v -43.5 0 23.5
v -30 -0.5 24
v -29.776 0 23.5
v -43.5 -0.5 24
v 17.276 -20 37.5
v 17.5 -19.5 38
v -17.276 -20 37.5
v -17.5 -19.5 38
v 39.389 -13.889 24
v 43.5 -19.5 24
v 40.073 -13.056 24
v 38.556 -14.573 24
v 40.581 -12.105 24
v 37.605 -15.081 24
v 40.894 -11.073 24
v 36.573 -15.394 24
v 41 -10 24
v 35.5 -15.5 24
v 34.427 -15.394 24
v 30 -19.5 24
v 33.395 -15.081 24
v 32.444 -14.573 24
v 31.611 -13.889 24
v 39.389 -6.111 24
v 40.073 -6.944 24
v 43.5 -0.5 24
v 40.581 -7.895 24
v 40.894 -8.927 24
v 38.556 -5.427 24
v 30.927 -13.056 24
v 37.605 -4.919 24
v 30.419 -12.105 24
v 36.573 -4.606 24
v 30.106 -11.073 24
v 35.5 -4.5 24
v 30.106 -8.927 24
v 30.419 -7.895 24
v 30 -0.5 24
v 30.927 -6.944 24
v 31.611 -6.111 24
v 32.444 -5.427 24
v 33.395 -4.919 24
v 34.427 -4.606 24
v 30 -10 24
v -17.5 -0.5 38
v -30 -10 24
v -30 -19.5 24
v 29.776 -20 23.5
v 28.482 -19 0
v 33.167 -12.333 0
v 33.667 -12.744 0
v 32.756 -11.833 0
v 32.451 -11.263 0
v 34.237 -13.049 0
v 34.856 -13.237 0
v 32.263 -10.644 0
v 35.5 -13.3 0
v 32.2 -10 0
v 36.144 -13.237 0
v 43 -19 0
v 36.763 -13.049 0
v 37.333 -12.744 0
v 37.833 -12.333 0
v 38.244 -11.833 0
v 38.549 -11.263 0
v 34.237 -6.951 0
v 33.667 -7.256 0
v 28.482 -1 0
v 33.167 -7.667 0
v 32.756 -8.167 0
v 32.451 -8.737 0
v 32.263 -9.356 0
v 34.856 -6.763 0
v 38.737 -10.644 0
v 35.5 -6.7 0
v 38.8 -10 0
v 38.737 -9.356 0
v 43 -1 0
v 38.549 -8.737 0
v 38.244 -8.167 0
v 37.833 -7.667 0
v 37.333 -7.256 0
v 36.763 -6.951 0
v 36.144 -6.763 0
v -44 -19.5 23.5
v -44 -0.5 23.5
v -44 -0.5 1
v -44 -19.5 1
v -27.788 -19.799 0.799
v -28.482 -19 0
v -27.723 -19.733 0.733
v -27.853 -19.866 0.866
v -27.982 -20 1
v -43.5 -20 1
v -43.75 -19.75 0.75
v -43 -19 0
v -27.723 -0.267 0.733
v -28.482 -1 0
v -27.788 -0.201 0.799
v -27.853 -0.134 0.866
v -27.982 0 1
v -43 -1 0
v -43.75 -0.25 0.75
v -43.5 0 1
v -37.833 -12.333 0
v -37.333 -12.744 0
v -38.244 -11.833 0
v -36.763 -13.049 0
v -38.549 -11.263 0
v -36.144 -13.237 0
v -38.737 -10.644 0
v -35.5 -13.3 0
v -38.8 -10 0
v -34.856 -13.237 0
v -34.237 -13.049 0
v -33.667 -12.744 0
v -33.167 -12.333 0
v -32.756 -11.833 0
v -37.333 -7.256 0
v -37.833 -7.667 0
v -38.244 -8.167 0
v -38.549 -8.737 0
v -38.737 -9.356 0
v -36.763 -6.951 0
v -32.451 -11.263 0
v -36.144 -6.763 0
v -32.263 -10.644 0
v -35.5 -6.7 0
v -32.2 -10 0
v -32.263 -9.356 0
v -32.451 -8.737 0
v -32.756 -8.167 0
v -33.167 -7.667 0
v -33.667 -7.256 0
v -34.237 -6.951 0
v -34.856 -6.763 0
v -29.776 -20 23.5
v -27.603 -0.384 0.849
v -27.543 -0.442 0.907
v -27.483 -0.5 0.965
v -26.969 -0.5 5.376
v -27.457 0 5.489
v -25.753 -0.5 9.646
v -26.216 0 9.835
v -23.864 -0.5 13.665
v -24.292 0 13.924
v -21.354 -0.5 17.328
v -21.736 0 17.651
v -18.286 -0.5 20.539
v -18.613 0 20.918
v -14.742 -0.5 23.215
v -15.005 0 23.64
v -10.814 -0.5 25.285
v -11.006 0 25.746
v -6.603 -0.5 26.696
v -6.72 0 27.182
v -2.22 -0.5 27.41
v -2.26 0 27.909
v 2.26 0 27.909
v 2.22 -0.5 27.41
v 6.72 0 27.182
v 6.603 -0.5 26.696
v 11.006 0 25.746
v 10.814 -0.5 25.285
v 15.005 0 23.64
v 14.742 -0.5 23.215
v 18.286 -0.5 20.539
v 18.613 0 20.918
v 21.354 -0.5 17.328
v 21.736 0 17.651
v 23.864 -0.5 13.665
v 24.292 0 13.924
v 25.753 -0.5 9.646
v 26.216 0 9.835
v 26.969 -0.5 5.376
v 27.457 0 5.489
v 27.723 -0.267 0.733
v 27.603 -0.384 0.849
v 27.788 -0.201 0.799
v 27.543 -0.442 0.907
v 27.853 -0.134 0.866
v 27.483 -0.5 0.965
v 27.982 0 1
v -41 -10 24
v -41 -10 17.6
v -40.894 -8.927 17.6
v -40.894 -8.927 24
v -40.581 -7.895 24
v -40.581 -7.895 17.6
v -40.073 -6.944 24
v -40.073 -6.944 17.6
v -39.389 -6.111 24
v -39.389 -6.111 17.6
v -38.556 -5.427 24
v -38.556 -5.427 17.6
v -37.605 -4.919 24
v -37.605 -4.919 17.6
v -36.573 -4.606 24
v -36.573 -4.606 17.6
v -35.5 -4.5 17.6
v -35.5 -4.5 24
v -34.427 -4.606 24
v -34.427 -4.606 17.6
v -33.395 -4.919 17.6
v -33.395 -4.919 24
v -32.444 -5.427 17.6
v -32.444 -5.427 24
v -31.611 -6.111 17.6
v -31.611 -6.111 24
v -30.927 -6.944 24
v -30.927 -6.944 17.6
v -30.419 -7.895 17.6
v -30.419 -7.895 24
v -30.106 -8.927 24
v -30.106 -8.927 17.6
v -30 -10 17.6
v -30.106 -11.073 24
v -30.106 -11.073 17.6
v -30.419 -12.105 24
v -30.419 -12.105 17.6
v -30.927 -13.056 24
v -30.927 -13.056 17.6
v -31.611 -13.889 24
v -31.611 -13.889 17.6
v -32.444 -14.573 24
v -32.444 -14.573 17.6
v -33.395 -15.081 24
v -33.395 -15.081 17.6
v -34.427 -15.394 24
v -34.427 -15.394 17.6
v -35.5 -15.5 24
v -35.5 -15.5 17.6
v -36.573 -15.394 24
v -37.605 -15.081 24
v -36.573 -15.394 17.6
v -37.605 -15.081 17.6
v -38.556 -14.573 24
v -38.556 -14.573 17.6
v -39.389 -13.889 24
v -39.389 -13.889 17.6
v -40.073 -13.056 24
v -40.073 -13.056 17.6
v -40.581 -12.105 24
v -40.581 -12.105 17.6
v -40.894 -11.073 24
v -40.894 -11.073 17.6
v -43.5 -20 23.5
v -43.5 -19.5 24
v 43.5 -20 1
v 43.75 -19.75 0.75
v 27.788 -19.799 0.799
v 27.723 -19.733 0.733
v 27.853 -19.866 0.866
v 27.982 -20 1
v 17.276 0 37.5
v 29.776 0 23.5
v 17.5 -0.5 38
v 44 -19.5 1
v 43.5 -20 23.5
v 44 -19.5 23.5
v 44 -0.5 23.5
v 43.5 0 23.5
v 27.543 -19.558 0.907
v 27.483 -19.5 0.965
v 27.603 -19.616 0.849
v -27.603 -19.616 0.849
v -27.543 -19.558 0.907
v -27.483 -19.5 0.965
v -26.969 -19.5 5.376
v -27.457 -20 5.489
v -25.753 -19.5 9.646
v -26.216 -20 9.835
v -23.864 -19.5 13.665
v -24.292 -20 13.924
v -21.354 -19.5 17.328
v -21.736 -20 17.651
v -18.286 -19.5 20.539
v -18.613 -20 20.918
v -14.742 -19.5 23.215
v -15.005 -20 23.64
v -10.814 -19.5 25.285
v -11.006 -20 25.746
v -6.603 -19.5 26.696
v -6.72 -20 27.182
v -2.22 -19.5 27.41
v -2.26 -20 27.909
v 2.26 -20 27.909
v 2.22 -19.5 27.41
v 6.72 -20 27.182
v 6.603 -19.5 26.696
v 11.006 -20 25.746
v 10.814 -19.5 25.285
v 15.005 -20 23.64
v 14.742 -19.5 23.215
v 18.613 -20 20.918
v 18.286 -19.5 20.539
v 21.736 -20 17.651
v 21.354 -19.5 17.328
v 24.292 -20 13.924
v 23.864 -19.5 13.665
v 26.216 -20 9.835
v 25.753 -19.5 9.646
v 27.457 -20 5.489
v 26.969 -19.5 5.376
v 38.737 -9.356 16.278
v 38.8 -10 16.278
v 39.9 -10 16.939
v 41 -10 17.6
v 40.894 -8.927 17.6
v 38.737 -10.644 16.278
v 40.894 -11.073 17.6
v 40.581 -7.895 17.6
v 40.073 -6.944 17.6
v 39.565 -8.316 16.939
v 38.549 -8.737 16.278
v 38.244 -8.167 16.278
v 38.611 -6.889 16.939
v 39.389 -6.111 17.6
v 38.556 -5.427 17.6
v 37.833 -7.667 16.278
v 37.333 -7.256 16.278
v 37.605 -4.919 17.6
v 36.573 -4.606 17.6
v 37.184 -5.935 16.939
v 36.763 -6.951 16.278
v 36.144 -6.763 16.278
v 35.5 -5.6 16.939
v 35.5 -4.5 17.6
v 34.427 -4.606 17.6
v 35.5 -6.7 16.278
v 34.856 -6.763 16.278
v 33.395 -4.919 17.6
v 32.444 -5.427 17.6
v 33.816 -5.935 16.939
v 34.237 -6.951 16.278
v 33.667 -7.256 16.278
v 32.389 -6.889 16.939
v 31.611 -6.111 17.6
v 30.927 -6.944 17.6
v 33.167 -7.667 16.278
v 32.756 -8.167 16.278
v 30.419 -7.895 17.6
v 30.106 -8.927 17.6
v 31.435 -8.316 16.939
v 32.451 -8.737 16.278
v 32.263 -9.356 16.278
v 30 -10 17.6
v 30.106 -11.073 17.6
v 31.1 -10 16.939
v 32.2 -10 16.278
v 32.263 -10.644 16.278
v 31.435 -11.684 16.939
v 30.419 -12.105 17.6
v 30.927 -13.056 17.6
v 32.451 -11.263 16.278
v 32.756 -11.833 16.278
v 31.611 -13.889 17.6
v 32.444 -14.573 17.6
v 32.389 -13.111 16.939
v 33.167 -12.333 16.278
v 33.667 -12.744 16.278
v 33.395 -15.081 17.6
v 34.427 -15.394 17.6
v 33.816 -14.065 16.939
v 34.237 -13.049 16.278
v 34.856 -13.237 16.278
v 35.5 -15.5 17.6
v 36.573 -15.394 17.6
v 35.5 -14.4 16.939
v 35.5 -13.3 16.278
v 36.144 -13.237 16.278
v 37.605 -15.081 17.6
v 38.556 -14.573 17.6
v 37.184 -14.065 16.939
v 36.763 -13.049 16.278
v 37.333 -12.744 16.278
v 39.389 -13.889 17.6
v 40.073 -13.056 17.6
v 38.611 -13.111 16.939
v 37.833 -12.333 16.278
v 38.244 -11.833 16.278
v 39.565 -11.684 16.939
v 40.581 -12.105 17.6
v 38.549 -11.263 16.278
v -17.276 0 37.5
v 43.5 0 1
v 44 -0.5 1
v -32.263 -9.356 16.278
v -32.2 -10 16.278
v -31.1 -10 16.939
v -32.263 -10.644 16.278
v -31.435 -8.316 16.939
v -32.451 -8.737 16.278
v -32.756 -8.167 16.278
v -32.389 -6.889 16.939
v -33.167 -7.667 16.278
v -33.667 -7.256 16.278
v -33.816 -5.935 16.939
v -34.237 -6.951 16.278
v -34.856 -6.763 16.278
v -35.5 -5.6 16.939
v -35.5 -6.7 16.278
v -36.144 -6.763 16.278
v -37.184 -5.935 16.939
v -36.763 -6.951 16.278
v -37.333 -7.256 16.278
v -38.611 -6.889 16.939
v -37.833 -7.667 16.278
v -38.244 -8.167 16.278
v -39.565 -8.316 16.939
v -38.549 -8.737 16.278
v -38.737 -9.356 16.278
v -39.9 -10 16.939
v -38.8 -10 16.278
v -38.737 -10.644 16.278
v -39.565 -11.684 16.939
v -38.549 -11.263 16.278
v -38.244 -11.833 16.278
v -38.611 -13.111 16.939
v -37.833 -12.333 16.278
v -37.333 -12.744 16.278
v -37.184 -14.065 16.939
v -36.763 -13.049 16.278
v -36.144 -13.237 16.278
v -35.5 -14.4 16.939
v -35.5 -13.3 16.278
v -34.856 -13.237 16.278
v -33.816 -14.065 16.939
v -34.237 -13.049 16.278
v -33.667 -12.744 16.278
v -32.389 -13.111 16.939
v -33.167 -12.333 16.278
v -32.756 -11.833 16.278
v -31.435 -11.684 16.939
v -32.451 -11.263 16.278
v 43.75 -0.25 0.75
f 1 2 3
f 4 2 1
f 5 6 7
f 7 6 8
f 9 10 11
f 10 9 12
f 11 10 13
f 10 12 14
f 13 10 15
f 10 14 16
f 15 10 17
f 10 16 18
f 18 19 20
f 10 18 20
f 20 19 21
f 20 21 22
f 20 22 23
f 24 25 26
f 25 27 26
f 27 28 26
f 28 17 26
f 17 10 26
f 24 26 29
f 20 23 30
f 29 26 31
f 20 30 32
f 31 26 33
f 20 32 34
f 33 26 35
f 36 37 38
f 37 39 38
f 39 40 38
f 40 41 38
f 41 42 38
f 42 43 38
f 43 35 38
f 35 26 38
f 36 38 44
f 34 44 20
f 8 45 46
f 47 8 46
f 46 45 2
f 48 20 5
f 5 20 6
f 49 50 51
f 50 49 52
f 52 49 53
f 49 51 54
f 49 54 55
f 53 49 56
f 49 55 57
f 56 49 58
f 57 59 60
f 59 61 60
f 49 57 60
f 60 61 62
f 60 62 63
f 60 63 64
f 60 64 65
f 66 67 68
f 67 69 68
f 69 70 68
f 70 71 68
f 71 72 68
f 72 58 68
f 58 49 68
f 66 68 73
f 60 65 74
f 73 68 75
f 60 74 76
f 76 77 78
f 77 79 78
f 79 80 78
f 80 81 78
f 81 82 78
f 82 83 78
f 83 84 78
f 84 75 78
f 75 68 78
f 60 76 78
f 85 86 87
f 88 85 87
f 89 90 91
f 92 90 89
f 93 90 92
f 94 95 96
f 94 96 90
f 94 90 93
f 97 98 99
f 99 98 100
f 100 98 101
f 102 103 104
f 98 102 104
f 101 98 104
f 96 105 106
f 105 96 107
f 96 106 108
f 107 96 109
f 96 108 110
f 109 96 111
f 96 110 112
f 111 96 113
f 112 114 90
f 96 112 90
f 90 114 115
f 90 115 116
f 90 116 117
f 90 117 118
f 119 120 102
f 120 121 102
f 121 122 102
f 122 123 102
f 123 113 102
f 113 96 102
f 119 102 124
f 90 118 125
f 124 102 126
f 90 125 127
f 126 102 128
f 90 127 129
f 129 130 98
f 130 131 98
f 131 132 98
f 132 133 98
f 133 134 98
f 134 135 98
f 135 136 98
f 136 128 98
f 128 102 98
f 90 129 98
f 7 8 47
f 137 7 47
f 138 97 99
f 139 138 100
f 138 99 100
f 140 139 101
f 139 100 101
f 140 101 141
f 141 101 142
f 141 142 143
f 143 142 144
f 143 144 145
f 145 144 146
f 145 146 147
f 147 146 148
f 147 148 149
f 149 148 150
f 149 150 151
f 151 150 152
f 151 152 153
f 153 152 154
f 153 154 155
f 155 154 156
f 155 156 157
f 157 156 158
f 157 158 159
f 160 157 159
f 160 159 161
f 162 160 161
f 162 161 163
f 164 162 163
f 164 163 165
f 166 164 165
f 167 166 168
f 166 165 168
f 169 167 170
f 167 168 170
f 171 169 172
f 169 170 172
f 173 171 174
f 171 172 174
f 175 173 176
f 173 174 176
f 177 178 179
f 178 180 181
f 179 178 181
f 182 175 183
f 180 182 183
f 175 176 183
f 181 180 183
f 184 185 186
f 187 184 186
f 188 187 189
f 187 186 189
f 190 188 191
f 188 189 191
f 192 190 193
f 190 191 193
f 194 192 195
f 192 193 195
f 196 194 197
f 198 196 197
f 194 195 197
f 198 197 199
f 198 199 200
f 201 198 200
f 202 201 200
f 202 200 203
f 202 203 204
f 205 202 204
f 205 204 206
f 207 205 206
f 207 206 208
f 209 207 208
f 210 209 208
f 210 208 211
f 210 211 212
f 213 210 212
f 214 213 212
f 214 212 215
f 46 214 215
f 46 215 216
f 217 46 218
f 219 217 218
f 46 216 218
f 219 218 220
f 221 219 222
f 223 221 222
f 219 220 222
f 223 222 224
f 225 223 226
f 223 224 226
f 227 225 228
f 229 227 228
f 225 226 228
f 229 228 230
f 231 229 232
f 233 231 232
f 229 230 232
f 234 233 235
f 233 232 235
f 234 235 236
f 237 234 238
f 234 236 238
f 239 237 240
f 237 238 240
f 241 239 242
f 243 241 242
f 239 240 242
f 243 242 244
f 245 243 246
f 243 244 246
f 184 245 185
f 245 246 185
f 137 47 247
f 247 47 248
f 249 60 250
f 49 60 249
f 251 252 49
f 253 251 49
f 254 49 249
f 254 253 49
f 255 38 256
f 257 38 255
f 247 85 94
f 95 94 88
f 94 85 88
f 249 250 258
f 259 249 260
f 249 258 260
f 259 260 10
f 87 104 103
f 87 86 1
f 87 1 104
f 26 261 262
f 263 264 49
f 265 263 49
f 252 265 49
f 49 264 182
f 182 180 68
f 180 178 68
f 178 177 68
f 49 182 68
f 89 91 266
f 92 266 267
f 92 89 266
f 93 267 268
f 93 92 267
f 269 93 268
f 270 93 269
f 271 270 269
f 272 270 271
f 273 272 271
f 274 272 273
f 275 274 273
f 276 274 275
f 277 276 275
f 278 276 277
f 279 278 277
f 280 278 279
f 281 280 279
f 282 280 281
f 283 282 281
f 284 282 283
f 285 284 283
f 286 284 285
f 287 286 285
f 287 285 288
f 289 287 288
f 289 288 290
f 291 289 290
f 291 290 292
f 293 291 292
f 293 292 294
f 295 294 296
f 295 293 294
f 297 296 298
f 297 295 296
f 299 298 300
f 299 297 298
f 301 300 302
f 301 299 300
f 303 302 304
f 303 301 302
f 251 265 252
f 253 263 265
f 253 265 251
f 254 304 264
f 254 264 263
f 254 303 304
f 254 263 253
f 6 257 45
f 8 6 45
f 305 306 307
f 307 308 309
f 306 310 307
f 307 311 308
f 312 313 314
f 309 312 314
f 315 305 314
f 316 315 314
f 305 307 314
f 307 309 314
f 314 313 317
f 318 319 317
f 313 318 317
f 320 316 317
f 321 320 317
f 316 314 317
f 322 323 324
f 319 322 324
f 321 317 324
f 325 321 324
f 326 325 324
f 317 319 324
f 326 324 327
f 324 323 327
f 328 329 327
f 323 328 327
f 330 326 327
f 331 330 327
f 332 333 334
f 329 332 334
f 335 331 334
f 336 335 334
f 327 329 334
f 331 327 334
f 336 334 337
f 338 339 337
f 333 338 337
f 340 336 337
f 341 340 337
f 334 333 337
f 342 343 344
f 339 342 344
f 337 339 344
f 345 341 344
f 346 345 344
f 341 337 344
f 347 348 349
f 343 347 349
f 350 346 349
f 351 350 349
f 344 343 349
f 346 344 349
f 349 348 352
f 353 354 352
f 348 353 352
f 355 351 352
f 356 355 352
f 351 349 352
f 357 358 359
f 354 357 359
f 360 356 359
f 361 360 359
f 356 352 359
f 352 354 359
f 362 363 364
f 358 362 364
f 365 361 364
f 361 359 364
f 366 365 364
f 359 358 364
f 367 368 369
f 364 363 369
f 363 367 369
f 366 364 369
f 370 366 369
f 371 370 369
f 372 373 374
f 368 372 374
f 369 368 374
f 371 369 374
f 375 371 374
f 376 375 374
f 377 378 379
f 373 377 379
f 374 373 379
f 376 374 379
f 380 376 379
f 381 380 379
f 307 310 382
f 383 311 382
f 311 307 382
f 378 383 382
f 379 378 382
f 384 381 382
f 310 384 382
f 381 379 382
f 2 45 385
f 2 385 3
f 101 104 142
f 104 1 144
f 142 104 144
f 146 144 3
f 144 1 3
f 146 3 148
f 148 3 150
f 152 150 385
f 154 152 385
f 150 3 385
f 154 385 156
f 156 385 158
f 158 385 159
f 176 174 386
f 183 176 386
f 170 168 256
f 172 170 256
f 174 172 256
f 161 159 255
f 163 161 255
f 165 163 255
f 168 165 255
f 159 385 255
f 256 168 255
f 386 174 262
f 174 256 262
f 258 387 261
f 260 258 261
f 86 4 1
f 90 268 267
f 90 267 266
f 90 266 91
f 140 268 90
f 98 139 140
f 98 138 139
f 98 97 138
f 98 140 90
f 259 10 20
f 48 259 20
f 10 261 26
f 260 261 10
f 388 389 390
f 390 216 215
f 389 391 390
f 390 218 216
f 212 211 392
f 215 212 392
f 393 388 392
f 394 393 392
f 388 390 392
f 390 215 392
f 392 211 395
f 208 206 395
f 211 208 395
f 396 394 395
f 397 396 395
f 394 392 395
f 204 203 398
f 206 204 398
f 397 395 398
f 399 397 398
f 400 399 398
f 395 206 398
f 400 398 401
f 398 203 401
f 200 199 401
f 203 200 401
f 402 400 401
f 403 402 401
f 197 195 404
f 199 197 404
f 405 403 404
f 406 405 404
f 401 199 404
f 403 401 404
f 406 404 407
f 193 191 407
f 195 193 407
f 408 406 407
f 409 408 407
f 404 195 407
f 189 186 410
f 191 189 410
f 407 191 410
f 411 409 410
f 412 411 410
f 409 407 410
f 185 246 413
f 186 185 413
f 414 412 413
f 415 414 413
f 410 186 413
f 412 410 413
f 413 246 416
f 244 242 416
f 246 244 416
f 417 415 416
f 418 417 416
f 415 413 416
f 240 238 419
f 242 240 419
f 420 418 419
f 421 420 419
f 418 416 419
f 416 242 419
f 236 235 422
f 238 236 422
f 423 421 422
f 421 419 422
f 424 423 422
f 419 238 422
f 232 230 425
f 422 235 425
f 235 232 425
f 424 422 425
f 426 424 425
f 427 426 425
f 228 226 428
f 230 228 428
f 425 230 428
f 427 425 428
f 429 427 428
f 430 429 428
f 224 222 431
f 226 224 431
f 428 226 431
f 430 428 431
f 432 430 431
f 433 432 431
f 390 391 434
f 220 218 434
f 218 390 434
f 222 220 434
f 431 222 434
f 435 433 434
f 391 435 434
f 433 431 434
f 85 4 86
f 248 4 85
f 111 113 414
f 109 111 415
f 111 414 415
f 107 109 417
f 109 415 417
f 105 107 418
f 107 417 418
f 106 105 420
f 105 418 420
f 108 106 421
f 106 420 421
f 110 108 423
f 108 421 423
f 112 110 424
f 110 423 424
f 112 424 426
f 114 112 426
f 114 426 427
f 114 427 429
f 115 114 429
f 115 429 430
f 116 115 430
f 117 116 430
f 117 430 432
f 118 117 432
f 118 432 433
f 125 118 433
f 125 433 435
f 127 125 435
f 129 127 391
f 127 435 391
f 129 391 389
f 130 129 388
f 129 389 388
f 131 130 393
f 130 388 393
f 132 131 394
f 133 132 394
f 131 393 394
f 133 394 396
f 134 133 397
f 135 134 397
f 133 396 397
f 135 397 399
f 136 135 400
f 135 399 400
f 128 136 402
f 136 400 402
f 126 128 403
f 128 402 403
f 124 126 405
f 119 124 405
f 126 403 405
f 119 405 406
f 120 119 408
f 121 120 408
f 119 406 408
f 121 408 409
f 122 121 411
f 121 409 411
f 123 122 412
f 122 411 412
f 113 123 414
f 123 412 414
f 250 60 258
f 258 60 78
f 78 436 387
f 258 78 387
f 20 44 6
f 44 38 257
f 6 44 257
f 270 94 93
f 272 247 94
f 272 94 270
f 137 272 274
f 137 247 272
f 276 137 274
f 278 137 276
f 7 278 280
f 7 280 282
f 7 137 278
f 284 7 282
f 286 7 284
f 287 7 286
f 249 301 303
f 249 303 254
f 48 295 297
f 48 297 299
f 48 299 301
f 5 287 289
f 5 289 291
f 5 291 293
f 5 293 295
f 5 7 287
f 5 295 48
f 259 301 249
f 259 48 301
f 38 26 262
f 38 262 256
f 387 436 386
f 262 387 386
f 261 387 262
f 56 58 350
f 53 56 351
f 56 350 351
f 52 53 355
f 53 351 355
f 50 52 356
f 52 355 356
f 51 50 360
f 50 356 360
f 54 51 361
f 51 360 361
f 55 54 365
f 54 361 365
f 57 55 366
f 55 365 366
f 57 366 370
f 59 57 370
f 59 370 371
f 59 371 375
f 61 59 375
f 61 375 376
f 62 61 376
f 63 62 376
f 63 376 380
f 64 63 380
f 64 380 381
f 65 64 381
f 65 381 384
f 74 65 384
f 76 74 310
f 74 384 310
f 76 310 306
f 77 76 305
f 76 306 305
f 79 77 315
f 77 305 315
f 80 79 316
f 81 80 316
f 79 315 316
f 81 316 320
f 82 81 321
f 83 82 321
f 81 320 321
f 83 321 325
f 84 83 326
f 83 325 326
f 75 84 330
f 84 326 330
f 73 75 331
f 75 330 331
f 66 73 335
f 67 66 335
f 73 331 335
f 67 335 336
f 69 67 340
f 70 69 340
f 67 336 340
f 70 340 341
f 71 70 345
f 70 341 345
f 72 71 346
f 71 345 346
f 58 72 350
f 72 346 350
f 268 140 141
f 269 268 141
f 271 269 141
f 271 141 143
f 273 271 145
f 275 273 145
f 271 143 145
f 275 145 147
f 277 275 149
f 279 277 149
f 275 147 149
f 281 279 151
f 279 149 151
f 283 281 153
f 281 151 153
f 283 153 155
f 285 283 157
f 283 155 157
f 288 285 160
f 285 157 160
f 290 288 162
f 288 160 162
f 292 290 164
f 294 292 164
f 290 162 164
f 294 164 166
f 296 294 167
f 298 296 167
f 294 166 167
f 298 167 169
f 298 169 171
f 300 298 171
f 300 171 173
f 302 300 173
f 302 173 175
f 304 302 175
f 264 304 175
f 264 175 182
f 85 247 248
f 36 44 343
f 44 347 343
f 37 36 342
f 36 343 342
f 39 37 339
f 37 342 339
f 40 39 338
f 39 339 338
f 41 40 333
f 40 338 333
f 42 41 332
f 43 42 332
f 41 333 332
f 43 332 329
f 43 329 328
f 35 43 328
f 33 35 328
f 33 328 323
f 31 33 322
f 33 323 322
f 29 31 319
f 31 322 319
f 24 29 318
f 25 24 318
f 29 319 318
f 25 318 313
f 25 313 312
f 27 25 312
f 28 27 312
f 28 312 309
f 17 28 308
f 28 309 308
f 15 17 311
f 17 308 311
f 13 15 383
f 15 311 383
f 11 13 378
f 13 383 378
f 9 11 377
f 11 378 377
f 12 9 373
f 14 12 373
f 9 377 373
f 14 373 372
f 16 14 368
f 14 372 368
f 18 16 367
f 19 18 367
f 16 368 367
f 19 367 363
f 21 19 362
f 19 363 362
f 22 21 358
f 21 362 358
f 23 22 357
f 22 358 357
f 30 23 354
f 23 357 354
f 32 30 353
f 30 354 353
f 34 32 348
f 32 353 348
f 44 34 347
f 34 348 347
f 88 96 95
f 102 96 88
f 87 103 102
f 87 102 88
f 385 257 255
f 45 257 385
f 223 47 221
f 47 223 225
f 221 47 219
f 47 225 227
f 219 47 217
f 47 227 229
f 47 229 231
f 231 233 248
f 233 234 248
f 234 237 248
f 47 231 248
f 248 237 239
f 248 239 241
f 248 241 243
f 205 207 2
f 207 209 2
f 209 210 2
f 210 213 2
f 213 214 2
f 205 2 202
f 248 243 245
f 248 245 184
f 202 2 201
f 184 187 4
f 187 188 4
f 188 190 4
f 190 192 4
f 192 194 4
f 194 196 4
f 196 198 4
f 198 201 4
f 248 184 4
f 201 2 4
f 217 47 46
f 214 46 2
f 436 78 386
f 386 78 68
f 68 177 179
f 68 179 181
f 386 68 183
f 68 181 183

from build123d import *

# Parameters (mm, degrees)
F1_DEPTH    = 20
F3_D        = 6.6
F5_D        = 11
F5_DEPTH    = 6.4
F5_TIP      = 3.3047334047
F7_D        = 11
F7_DEPTH    = 6.4
F7_TIP      = 3.3047334047
F8_T1_DEPTH = 21.6433659759
F8_T3_DEPTH = 25.1433659759
F8_T5_DEPTH = 21.6433659759
F8_T7_DEPTH = 25.0580427678
F9_SIZE     = 0.5


# Not quite as in the source:
# - a fillet or chamfer that OpenCascade refuses, or shapes differently, is made with other operations: its cross-section is extruded or revolved along the edge and cut away or added


with BuildPart() as f1:
    # F0 (on Front) → F1 (new body)
    with BuildSketch(Plane.XZ):
        with BuildLine():
            ThreePointArc((-27.5, 0), (0, 27.5), (27.5, 0))
            Line((27.5, 0), (44, 0))
            Line((44, 0), (44, 24))
            Line((44, 24), (30, 24))
            Line((30, 24), (17.5, 38))
            Line((17.5, 38), (-17.5, 38))
            Line((-17.5, 38), (-30, 24))
            Line((-30, 24), (-44, 24))
            Line((-44, 24), (-44, 0))
            Line((-44, 0), (-27.5, 0))
        make_face()
    extrude(amount=F1_DEPTH)

    # F3 (through all)
    with Locations(Plane(origin=(0, 0, 0), x_dir=(1, 0, 0), z_dir=(0, 0, -1))):
        with Locations((-35.5, 10), (35.5, 10)):
            Hole(F3_D / 2)

    # F5
    with Locations(Plane.XY.offset(24)):
        with Locations((-35.5, -10)):
            Hole(F5_D / 2, depth=F5_DEPTH)
            with Locations((0, 0, -(F5_DEPTH + F5_TIP / 2))):  # 118° drill point
                Cone(0, F5_D / 2, F5_TIP, mode=Mode.SUBTRACT)

    # F7
    with Locations(Plane.XY.offset(24)):
        with Locations((35.5, -10)):
            Hole(F7_D / 2, depth=F7_DEPTH)
            with Locations((0, 0, -(F7_DEPTH + F7_TIP / 2))):  # 118° drill point
                Cone(0, F7_D / 2, F7_TIP, mode=Mode.SUBTRACT)

    # F8: chamfer of 1 on 8 edges, made by hand

    # F8_s2 → F8_t1 (cut)
    with BuildSketch(Plane.YZ.offset(24.928317012)):
        Polygon((-19, 0), (-20, 1), (-20, 0), align=None)
        Polygon((-1, 0), (0, 1), (0, 0), align=None)
    extrude(amount=F8_T1_DEPTH, mode=Mode.SUBTRACT)

    # F8_s4 → F8_t3 (cut)
    with BuildSketch(Plane.XZ.offset(-2.571682988)):
        Polygon((43, 0), (44, 1), (44, 0), align=None)
        Polygon((-43, 0), (-44, 1), (-44, 0), align=None)
    extrude(amount=F8_T3_DEPTH, mode=Mode.SUBTRACT)

    # F8_s6 → F8_t5 (cut)
    with BuildSketch(Plane.YZ.offset(-46.571682988)):
        Polygon((-19, 0), (-20, 1), (-20, 0), align=None)
        Polygon((-1, 0), (0, 1), (0, 0), align=None)
    extrude(amount=F8_T5_DEPTH, mode=Mode.SUBTRACT)

    # F8_s8 → F8_t7 (cut)
    with BuildSketch(Plane.XZ.offset(-2.5290213839)):
        with BuildLine():
            Line((-27.4830665009, 0.9649122807), (-28.4824507373, 0))
            Line((-28.4824507373, 0), (-27.5, 0))
            ThreePointArc((-27.5, 0), (-27.4955143469, 0.4966797747), (-27.4830665009, 0.9649122807))
        make_face()
        with BuildLine():
            Line((27.4830665009, 0.9649122807), (28.4824507373, 0))
            Line((28.4824507373, 0), (27.5, 0))
            ThreePointArc((27.5, 0), (27.4955143469, 0.4966797747), (27.4830665009, 0.9649122807))
        make_face()
    extrude(amount=F8_T7_DEPTH, mode=Mode.SUBTRACT)

    # F9
    f9_edges = [f1.edges().sort_by_distance(p)[0] for p in [
        (44, -20, 12.5),
        (44, 0, 12.5),
        (44, -10, 24),
        (37, -20, 24),
        (37, 0, 24),
        (23.75, 0, 31),
        (23.75, -20, 31),
        (0, -20, 38),
        (0, 0, 38),
        (-23.75, -20, 31),
        (0, -20, 27.5),
        (-44, -20, 12.5),
        (-37, -20, 24),
        (-44, -10, 24),
        (-37, 0, 24),
        (0, 0, 27.5),
        (-23.75, 0, 31),
        (-44, 0, 12.5),
    ]]
    chamfer(f9_edges, length=F9_SIZE)


solid = f1.part
